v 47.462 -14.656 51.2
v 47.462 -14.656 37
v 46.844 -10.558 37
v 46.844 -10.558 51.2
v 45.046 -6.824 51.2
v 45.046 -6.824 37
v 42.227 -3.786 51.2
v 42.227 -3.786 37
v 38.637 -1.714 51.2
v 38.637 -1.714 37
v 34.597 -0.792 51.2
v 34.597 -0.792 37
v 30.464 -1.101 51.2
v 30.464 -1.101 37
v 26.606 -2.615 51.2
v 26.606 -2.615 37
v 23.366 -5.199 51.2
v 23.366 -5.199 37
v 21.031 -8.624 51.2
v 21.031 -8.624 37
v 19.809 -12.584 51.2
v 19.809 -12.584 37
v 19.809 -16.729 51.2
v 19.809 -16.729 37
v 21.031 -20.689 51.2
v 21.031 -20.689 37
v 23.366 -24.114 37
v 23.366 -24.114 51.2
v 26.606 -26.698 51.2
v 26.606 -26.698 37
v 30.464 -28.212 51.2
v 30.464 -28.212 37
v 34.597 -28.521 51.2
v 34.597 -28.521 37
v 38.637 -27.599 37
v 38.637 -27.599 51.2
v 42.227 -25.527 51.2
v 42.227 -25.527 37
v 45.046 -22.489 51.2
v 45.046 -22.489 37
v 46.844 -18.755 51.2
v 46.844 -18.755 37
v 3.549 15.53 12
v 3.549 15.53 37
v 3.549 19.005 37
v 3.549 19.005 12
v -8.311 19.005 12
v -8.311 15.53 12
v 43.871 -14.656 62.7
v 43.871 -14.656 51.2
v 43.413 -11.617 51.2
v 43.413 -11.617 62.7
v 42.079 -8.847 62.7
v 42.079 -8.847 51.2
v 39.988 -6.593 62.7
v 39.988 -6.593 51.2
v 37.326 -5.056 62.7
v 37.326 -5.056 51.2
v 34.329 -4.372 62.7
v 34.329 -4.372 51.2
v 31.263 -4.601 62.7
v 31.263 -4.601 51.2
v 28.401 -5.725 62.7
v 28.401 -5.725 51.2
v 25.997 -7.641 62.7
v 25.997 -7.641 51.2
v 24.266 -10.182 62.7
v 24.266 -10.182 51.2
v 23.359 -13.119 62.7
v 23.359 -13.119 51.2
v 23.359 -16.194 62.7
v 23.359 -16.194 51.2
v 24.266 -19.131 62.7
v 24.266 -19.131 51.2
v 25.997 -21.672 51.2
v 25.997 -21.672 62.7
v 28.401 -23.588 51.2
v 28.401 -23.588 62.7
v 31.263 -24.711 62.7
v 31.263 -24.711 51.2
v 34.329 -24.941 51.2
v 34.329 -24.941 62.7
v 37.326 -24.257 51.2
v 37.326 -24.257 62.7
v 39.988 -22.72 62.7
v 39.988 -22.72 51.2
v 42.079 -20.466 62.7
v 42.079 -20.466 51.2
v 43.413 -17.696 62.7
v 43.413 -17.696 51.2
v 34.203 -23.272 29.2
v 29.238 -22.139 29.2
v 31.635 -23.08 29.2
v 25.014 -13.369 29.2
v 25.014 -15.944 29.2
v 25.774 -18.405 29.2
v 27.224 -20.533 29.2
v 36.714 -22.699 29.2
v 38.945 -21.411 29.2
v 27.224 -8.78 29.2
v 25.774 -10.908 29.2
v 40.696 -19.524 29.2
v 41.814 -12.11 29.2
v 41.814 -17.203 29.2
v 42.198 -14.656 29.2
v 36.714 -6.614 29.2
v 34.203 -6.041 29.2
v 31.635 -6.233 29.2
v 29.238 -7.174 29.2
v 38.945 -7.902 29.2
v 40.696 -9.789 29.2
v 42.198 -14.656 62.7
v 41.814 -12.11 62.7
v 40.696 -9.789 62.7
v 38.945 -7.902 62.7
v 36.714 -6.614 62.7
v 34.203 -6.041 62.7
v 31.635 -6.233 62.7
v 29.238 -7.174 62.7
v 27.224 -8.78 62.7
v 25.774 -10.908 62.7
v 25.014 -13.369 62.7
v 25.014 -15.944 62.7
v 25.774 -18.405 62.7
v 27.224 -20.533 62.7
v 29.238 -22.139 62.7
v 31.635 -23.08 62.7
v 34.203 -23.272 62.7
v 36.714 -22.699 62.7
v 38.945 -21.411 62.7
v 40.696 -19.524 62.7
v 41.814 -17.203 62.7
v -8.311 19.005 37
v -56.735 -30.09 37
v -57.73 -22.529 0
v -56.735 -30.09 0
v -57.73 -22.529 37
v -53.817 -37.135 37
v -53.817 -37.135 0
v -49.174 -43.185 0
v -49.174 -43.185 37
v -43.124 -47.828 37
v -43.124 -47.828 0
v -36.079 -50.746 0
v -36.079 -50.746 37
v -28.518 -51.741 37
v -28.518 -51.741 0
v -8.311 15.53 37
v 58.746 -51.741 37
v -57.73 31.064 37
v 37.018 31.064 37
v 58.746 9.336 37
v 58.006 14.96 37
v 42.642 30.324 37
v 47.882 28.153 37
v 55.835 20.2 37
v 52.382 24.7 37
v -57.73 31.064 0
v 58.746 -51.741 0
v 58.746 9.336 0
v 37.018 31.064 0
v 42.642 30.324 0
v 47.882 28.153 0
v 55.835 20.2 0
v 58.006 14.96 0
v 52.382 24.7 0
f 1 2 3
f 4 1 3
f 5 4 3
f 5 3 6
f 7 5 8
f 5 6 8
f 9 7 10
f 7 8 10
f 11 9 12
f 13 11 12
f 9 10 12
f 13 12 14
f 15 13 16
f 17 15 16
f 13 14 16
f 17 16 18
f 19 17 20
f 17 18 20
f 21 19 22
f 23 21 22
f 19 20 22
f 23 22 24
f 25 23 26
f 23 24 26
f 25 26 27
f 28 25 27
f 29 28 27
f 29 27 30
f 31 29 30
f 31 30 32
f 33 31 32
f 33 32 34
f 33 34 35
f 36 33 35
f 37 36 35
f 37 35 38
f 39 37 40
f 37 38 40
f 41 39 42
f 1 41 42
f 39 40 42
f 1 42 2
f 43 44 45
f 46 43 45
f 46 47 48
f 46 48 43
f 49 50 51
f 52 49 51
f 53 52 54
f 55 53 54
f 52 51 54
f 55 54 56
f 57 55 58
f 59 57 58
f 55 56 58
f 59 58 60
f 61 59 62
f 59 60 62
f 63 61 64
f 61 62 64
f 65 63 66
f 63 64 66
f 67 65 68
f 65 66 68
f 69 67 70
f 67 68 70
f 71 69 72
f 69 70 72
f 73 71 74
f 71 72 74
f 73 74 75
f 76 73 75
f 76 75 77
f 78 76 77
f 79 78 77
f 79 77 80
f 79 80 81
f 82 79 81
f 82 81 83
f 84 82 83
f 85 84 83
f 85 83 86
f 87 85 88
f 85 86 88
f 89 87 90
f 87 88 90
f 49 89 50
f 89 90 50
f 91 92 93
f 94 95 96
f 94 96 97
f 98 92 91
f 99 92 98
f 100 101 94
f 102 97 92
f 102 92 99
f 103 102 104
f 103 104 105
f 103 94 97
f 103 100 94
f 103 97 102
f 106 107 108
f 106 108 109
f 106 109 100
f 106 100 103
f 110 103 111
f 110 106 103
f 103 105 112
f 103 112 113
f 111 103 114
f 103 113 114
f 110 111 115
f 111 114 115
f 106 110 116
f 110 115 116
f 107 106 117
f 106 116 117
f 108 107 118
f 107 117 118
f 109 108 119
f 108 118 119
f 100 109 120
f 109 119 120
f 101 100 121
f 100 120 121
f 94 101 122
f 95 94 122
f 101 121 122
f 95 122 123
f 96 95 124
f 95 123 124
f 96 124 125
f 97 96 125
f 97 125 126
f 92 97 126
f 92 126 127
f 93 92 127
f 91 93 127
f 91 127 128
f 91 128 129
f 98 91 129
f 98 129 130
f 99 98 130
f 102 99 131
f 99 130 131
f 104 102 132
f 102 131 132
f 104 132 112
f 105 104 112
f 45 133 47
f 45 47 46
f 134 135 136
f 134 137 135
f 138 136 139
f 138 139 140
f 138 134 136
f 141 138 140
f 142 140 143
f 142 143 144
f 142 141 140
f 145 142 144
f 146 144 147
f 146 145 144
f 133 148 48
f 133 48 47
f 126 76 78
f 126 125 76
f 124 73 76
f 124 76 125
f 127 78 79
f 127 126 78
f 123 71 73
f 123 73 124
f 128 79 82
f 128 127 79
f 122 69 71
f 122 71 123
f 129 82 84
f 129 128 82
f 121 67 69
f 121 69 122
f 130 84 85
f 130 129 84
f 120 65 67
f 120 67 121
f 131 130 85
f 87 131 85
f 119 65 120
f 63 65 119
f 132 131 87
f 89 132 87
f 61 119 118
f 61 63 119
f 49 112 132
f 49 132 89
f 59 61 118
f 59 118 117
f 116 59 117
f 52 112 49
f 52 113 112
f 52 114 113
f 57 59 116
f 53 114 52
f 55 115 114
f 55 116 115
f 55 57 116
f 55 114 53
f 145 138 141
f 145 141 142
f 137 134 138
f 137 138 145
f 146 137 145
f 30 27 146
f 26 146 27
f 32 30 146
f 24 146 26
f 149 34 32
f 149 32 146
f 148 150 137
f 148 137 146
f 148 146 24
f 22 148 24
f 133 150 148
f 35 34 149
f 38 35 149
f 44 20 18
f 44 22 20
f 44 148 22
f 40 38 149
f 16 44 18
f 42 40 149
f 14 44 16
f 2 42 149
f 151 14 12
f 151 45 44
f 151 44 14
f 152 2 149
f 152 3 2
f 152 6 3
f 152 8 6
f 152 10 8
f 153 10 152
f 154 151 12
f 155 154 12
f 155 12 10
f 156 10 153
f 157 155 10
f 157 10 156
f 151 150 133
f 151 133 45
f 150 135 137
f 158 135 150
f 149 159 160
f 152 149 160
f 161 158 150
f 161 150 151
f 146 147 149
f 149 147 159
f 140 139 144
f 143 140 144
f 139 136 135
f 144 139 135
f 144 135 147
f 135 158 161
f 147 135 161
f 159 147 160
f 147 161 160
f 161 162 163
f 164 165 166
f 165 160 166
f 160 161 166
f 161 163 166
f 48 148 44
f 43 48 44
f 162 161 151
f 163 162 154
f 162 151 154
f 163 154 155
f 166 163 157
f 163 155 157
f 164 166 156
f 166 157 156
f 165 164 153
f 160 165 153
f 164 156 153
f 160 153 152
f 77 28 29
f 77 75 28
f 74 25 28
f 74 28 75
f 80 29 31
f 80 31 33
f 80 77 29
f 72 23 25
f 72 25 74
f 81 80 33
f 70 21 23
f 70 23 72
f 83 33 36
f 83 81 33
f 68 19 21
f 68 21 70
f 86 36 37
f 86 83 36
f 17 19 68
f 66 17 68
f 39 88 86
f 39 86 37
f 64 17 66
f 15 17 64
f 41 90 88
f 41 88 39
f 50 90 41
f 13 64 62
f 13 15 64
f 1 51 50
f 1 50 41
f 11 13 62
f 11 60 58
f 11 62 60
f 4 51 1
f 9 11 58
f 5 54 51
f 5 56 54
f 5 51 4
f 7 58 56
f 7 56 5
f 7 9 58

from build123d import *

# Parameters (mm, degrees)
F0_W      = 116.4761967957
F0_H      = 82.8055683523
F1_DEPTH  = 37
F2_R      = 13.9038489757
F3_DEPTH  = 14.2
F6_R      = 10.3135851835
F7_DEPTH  = 11.5
F8_R      = 8.6398790052
F9_DEPTH  = 33.5
F10_R     = 21.7279220614
F11_R     = 29.2119841047
F12_W     = 11.8597049732
F12_H     = 3.4746369347
F13_DEPTH = 25


# Not quite as in the source:
# - the program builds the solid bodies; features that only make, move or delete a surface that nothing else refers to are left out


with BuildPart() as f1:
    # F0 (on Top) → F1 (new body)
    with BuildSketch(Plane.XY):
        with Locations((0.5078110844, -10.3384470567)):
            Rectangle(F0_W, F0_H)
    extrude(amount=F1_DEPTH)

    # F2 (on face) → F3 (join)
    with BuildSketch(Plane.XY.offset(37)):
        with Locations((33.5578107329, -14.6564913073)):
            Circle(F2_R)
    extrude(amount=F3_DEPTH)

    # F6 (on face) → F7 (join)
    with BuildSketch(Plane.XY.offset(51.2)):
        with Locations((33.5578107329, -14.6564913073)):
            Circle(F6_R)
    extrude(amount=F7_DEPTH)

    # F8 (on face) → F9 (cut)
    with BuildSketch(Plane.XY.offset(62.7)):
        with Locations((33.5578107329, -14.6564913073)):
            Circle(F8_R)
    extrude(amount=-F9_DEPTH, mode=Mode.SUBTRACT)

    # F10
    f10_edges = [f1.edges().sort_by_distance(p)[0] for p in [
        (58.745909, 31.064337, 18.5),
    ]]
    fillet(f10_edges, radius=F10_R)

    # F11
    f11_edges = [f1.edges().sort_by_distance(p)[0] for p in [
        (-57.730287, -51.741231, 18.5),
    ]]
    fillet(f11_edges, radius=F11_R)

    # F12 (on face) → F13 (cut)
    with BuildSketch(Plane.XY.offset(37)):
        with Locations((-2.380865044, 17.2674548812)):
            Rectangle(F12_W, F12_H)
    extrude(amount=-F13_DEPTH, mode=Mode.SUBTRACT)


solid = f1.part
